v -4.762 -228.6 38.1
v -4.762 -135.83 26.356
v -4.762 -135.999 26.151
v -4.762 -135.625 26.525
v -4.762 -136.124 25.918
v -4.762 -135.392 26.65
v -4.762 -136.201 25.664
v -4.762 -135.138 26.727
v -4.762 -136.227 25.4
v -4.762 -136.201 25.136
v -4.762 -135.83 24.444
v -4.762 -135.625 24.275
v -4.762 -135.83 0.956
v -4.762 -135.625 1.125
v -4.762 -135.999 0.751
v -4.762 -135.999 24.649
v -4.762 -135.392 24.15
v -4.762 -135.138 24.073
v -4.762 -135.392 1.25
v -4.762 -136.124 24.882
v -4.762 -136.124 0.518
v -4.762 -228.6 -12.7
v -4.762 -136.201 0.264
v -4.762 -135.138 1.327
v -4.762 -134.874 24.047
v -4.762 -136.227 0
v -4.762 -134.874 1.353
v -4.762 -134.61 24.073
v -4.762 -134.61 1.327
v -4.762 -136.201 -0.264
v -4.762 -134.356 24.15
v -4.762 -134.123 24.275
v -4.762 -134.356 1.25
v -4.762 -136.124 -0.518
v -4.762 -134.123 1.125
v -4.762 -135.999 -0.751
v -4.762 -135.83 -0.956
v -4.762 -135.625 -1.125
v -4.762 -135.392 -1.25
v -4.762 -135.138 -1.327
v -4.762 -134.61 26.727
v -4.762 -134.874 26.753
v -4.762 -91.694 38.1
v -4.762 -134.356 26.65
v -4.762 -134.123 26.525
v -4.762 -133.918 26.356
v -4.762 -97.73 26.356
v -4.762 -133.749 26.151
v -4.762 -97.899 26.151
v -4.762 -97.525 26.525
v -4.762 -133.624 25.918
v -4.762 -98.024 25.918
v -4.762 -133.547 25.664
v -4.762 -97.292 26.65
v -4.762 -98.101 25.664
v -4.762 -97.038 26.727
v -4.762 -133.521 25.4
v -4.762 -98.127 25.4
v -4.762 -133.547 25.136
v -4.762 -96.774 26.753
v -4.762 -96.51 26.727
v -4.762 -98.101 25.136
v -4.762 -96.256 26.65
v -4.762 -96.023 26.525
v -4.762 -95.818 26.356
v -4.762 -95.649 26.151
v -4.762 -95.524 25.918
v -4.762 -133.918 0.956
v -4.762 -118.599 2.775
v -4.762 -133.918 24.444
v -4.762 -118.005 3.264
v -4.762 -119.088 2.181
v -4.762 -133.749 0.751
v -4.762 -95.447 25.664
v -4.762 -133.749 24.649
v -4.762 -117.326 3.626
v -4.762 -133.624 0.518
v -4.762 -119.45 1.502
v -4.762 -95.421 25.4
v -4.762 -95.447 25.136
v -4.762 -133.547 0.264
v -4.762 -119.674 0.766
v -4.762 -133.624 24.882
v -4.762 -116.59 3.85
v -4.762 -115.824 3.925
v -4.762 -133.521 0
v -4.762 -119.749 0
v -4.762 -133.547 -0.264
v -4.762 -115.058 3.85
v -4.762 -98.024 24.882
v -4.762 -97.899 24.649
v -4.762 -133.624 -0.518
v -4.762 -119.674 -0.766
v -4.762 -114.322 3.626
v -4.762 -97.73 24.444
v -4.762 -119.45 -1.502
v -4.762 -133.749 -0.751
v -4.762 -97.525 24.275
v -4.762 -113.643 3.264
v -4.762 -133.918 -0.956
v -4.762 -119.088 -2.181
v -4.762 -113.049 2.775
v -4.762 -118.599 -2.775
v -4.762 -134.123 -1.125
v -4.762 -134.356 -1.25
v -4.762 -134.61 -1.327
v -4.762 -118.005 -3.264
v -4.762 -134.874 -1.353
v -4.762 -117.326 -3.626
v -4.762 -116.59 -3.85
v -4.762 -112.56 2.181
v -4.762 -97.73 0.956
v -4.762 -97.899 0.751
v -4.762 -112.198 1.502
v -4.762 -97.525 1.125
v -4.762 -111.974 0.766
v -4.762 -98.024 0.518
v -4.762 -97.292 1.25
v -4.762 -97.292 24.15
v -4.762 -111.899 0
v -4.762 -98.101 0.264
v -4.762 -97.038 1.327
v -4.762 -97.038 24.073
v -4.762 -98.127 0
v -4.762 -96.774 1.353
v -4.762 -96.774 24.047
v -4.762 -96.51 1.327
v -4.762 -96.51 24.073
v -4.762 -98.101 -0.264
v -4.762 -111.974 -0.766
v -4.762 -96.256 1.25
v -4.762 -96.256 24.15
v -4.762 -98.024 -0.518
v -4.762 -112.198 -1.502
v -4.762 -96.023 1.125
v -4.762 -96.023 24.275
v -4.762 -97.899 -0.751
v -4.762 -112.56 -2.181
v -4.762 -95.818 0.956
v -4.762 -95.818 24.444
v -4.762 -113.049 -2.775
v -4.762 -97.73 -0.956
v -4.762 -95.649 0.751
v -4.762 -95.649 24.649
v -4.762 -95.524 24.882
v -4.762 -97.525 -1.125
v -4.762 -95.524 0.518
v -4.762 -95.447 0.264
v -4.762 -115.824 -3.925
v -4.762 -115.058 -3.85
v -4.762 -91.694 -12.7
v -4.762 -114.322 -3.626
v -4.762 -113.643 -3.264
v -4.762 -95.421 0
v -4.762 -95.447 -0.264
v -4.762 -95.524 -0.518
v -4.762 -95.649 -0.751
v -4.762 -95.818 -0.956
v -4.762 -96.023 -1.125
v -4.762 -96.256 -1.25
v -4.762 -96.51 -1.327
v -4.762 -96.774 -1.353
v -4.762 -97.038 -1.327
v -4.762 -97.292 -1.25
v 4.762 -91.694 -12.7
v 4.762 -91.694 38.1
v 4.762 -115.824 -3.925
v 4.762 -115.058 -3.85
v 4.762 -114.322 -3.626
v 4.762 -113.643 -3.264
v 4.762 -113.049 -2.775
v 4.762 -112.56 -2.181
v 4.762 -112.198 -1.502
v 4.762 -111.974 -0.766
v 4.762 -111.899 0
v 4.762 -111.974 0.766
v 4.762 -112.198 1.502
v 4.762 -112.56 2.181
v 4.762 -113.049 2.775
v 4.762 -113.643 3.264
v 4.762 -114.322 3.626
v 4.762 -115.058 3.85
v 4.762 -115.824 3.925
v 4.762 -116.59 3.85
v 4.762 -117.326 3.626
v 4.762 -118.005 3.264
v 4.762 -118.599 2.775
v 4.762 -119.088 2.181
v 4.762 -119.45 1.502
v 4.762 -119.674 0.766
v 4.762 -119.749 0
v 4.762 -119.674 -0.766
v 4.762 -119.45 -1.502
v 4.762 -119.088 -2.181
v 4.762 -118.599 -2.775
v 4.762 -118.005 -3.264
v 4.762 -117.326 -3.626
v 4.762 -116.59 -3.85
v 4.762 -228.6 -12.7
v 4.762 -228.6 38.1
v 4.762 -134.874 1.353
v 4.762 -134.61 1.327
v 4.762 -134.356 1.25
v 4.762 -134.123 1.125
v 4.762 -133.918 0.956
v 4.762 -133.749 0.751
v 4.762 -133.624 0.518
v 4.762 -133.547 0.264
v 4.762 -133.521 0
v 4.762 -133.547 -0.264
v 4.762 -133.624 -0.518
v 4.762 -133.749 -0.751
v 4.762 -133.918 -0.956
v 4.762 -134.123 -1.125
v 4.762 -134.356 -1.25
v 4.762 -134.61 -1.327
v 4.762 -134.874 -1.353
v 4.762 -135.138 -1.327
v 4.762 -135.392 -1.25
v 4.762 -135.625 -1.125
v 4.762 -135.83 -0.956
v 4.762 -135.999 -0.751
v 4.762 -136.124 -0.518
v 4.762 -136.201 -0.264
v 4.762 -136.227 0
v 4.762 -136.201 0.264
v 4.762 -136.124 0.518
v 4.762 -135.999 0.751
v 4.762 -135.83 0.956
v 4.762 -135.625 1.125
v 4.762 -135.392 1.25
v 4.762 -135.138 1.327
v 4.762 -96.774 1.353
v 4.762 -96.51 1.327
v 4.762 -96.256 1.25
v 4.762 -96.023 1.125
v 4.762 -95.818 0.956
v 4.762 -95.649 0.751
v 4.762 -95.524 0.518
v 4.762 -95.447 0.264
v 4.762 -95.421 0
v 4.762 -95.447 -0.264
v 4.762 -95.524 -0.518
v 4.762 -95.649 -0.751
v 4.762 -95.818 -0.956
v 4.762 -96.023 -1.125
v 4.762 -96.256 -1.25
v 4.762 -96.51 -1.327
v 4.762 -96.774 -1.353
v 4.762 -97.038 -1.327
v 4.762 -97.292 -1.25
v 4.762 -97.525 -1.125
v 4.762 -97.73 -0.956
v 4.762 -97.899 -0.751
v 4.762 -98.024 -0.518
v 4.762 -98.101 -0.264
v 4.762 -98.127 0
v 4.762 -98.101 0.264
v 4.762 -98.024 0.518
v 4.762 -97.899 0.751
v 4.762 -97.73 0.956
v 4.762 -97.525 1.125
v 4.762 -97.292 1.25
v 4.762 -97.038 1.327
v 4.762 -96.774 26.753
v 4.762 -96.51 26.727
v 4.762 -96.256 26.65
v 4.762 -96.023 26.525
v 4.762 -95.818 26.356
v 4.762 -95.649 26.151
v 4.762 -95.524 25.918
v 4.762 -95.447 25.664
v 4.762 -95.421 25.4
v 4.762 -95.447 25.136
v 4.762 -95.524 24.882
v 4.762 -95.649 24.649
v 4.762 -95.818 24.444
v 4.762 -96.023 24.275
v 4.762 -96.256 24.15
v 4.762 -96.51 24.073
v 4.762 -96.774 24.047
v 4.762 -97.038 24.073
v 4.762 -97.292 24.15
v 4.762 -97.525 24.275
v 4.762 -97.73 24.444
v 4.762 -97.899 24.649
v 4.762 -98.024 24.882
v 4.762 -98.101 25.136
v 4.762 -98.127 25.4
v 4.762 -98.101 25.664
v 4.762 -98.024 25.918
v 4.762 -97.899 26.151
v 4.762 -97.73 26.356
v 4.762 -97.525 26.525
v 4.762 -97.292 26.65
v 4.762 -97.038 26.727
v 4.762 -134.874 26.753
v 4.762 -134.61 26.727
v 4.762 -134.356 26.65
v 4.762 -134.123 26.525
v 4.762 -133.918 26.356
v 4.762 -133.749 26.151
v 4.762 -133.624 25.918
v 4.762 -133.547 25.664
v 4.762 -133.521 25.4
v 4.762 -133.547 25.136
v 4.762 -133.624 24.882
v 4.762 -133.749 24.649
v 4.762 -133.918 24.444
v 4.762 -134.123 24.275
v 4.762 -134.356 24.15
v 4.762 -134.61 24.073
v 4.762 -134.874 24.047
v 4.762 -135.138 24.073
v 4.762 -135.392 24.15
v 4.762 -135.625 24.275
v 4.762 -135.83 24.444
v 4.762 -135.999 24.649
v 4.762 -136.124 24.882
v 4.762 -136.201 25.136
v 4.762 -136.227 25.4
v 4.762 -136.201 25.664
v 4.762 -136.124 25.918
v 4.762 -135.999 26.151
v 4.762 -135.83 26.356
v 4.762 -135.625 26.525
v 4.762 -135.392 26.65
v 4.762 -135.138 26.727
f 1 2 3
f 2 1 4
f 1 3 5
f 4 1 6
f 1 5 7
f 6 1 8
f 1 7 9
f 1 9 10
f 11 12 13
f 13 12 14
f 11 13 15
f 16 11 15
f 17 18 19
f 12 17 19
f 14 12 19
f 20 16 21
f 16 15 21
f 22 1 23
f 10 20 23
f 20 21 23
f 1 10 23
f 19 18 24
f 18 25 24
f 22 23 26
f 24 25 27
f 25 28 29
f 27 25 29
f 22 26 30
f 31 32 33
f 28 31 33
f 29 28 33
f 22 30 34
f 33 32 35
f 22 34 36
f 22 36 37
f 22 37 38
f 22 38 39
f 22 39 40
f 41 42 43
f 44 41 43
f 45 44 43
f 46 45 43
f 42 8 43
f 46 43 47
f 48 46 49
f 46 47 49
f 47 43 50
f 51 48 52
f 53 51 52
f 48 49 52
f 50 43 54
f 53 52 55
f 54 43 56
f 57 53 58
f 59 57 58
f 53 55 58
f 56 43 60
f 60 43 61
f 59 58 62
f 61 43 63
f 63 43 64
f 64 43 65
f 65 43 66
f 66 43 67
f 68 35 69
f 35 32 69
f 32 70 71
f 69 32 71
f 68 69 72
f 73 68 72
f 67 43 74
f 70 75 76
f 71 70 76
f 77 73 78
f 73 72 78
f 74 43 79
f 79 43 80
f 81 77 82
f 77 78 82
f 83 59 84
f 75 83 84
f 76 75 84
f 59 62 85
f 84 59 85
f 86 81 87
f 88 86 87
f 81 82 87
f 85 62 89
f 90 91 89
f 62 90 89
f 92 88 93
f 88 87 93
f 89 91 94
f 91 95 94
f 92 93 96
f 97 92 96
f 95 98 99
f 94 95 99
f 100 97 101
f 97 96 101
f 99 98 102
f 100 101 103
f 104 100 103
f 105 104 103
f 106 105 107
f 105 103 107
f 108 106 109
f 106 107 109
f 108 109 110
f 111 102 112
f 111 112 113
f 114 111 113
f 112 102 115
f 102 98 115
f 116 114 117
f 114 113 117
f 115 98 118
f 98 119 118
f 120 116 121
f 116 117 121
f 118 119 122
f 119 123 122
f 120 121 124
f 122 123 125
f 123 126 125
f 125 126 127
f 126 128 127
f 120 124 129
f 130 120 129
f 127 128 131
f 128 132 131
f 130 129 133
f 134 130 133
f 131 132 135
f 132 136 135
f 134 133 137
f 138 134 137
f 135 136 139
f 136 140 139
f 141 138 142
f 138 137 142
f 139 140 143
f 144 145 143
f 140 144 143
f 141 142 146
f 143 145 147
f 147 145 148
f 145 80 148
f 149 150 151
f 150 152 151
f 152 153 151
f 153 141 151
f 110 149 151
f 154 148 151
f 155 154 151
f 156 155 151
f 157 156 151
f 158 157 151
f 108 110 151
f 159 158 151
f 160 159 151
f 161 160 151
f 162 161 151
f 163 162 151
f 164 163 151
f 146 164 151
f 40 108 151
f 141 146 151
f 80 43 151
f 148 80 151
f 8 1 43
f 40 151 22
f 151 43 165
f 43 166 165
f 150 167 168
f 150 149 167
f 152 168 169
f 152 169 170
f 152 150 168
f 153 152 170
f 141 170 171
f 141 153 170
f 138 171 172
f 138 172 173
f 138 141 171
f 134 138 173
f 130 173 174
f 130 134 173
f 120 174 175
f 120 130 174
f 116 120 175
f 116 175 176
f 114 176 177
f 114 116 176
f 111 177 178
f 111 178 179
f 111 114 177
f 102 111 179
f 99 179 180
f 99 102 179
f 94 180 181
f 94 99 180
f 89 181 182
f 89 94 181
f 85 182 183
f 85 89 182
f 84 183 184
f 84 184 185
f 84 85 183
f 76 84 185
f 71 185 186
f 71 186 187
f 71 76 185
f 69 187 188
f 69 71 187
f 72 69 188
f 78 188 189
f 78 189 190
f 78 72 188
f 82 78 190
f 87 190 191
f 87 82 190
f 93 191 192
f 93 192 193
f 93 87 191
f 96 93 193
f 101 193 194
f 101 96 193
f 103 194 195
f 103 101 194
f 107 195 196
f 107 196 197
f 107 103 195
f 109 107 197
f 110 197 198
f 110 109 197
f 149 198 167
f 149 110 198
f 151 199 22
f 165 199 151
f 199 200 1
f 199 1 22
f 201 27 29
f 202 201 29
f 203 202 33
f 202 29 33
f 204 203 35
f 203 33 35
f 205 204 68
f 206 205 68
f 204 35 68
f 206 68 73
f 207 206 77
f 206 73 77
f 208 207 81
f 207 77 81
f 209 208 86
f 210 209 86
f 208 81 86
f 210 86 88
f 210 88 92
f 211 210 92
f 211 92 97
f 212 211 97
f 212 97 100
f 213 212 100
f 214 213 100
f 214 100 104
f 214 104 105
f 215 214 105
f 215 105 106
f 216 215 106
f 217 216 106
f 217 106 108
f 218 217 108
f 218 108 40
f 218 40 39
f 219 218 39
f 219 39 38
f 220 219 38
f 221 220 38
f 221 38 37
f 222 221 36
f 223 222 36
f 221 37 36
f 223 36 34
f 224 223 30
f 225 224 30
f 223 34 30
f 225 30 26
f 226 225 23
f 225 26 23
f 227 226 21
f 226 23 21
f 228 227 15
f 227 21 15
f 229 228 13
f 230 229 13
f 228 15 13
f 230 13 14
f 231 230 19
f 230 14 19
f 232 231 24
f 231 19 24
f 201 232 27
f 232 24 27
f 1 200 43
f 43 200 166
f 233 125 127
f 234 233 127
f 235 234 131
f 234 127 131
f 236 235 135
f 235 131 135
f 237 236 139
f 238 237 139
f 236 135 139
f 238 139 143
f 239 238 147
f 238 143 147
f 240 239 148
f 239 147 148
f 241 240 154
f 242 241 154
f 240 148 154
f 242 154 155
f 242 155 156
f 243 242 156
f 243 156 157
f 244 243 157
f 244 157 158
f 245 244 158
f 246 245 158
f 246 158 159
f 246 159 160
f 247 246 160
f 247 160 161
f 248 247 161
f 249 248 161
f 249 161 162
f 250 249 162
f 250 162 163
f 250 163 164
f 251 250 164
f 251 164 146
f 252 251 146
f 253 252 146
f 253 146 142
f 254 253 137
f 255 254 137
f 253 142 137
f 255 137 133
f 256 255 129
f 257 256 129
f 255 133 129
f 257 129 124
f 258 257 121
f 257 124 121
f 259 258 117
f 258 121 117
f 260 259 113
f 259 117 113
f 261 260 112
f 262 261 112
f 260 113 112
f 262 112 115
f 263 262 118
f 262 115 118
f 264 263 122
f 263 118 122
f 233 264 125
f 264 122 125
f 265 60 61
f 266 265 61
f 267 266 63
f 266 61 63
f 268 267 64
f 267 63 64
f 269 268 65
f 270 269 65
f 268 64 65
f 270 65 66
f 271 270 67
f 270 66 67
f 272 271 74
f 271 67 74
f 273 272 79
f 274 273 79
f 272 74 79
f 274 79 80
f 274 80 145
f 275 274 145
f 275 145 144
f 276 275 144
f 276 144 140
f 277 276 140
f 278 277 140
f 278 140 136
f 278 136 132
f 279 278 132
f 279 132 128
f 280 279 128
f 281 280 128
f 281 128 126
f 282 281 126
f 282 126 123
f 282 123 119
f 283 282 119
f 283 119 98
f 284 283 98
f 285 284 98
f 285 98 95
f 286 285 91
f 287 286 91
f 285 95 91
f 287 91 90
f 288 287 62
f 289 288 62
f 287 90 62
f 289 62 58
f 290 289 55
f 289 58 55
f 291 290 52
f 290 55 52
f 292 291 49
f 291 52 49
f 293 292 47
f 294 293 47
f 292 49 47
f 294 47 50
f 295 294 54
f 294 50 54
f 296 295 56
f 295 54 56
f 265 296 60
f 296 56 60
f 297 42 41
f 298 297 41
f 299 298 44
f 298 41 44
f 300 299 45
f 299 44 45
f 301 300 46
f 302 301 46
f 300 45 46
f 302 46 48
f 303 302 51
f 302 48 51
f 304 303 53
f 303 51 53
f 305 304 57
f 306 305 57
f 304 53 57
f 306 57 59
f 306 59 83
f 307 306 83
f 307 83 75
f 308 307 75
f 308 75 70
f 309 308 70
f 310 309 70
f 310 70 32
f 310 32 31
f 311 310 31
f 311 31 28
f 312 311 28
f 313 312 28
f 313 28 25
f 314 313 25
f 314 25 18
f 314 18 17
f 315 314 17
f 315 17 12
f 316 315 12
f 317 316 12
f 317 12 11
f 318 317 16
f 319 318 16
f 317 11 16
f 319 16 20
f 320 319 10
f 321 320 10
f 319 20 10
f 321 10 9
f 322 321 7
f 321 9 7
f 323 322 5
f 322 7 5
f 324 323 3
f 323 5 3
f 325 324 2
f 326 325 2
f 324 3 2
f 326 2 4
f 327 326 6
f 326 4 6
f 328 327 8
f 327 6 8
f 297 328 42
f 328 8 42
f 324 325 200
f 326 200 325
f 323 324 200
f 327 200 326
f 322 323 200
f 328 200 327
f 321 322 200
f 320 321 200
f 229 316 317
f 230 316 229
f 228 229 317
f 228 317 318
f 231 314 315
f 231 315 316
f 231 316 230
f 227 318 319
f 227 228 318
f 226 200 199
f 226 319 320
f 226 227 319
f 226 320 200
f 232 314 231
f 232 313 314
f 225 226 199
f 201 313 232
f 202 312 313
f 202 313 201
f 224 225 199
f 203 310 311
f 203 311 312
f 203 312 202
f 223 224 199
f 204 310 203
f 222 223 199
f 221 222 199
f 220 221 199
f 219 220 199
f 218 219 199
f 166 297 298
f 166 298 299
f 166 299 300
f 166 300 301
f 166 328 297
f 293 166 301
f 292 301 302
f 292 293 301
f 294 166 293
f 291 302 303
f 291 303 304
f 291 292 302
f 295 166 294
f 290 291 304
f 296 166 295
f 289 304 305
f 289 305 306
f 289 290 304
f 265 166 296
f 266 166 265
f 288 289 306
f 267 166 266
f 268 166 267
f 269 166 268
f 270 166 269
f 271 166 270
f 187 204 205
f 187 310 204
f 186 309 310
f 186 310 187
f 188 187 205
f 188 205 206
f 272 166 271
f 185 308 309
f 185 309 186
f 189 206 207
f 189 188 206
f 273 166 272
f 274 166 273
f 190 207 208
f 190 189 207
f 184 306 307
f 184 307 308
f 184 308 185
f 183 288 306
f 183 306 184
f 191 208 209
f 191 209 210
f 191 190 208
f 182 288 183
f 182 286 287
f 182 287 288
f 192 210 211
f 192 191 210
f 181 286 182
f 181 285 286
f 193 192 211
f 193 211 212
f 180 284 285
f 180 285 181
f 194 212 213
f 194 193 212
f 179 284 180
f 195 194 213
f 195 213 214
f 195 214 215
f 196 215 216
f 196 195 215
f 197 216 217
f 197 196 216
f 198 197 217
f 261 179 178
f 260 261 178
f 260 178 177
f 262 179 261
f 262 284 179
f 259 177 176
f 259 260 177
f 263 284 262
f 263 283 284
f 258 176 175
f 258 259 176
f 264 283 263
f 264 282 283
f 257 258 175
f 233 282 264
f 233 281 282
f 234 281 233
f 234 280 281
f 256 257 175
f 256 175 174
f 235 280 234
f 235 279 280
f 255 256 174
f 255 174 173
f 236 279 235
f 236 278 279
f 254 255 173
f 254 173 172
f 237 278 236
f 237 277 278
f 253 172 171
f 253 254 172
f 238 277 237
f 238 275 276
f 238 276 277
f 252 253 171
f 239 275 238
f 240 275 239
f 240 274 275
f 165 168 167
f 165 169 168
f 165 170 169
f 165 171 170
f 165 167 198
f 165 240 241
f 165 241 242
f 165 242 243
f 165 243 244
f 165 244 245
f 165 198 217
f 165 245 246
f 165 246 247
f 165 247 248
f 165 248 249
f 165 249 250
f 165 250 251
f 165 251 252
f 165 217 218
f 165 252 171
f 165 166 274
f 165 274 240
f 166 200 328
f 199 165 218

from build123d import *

# Parameters (mm, degrees)
SKETCH1_W             = 50.8
SKETCH1_H             = 136.906
SKETCH1_R             = 3.925
BOSS_EXTRUDE1_DEPTH   = 4.7625
F_6_32_TAPPED_HOLE1_D = 2.7051


with BuildPart() as part:
    # Sketch1 → Boss-Extrude1 (new, symmetric)
    with BuildSketch(Plane(origin=(0, 0, 0), x_dir=(0, 0, -1), z_dir=(1, 0, 0))):
        with Locations((-12.7, -160.147)):
            Rectangle(SKETCH1_W, SKETCH1_H)
        with Locations((0, -115.824)):
            Circle(SKETCH1_R, mode=Mode.SUBTRACT)
    extrude(amount=BOSS_EXTRUDE1_DEPTH, both=True)

    # #6-32 Tapped Hole1 (through all)
    with Locations(Plane(origin=(4.7625, 0, 0), x_dir=(0, 0, -1), z_dir=(1, 0, 0))):
        with Locations((-25.4, -96.774), (0, -96.774), (0, -134.874), (-25.4, -134.874)):
            Hole(F_6_32_TAPPED_HOLE1_D / 2)


solid = part.part
